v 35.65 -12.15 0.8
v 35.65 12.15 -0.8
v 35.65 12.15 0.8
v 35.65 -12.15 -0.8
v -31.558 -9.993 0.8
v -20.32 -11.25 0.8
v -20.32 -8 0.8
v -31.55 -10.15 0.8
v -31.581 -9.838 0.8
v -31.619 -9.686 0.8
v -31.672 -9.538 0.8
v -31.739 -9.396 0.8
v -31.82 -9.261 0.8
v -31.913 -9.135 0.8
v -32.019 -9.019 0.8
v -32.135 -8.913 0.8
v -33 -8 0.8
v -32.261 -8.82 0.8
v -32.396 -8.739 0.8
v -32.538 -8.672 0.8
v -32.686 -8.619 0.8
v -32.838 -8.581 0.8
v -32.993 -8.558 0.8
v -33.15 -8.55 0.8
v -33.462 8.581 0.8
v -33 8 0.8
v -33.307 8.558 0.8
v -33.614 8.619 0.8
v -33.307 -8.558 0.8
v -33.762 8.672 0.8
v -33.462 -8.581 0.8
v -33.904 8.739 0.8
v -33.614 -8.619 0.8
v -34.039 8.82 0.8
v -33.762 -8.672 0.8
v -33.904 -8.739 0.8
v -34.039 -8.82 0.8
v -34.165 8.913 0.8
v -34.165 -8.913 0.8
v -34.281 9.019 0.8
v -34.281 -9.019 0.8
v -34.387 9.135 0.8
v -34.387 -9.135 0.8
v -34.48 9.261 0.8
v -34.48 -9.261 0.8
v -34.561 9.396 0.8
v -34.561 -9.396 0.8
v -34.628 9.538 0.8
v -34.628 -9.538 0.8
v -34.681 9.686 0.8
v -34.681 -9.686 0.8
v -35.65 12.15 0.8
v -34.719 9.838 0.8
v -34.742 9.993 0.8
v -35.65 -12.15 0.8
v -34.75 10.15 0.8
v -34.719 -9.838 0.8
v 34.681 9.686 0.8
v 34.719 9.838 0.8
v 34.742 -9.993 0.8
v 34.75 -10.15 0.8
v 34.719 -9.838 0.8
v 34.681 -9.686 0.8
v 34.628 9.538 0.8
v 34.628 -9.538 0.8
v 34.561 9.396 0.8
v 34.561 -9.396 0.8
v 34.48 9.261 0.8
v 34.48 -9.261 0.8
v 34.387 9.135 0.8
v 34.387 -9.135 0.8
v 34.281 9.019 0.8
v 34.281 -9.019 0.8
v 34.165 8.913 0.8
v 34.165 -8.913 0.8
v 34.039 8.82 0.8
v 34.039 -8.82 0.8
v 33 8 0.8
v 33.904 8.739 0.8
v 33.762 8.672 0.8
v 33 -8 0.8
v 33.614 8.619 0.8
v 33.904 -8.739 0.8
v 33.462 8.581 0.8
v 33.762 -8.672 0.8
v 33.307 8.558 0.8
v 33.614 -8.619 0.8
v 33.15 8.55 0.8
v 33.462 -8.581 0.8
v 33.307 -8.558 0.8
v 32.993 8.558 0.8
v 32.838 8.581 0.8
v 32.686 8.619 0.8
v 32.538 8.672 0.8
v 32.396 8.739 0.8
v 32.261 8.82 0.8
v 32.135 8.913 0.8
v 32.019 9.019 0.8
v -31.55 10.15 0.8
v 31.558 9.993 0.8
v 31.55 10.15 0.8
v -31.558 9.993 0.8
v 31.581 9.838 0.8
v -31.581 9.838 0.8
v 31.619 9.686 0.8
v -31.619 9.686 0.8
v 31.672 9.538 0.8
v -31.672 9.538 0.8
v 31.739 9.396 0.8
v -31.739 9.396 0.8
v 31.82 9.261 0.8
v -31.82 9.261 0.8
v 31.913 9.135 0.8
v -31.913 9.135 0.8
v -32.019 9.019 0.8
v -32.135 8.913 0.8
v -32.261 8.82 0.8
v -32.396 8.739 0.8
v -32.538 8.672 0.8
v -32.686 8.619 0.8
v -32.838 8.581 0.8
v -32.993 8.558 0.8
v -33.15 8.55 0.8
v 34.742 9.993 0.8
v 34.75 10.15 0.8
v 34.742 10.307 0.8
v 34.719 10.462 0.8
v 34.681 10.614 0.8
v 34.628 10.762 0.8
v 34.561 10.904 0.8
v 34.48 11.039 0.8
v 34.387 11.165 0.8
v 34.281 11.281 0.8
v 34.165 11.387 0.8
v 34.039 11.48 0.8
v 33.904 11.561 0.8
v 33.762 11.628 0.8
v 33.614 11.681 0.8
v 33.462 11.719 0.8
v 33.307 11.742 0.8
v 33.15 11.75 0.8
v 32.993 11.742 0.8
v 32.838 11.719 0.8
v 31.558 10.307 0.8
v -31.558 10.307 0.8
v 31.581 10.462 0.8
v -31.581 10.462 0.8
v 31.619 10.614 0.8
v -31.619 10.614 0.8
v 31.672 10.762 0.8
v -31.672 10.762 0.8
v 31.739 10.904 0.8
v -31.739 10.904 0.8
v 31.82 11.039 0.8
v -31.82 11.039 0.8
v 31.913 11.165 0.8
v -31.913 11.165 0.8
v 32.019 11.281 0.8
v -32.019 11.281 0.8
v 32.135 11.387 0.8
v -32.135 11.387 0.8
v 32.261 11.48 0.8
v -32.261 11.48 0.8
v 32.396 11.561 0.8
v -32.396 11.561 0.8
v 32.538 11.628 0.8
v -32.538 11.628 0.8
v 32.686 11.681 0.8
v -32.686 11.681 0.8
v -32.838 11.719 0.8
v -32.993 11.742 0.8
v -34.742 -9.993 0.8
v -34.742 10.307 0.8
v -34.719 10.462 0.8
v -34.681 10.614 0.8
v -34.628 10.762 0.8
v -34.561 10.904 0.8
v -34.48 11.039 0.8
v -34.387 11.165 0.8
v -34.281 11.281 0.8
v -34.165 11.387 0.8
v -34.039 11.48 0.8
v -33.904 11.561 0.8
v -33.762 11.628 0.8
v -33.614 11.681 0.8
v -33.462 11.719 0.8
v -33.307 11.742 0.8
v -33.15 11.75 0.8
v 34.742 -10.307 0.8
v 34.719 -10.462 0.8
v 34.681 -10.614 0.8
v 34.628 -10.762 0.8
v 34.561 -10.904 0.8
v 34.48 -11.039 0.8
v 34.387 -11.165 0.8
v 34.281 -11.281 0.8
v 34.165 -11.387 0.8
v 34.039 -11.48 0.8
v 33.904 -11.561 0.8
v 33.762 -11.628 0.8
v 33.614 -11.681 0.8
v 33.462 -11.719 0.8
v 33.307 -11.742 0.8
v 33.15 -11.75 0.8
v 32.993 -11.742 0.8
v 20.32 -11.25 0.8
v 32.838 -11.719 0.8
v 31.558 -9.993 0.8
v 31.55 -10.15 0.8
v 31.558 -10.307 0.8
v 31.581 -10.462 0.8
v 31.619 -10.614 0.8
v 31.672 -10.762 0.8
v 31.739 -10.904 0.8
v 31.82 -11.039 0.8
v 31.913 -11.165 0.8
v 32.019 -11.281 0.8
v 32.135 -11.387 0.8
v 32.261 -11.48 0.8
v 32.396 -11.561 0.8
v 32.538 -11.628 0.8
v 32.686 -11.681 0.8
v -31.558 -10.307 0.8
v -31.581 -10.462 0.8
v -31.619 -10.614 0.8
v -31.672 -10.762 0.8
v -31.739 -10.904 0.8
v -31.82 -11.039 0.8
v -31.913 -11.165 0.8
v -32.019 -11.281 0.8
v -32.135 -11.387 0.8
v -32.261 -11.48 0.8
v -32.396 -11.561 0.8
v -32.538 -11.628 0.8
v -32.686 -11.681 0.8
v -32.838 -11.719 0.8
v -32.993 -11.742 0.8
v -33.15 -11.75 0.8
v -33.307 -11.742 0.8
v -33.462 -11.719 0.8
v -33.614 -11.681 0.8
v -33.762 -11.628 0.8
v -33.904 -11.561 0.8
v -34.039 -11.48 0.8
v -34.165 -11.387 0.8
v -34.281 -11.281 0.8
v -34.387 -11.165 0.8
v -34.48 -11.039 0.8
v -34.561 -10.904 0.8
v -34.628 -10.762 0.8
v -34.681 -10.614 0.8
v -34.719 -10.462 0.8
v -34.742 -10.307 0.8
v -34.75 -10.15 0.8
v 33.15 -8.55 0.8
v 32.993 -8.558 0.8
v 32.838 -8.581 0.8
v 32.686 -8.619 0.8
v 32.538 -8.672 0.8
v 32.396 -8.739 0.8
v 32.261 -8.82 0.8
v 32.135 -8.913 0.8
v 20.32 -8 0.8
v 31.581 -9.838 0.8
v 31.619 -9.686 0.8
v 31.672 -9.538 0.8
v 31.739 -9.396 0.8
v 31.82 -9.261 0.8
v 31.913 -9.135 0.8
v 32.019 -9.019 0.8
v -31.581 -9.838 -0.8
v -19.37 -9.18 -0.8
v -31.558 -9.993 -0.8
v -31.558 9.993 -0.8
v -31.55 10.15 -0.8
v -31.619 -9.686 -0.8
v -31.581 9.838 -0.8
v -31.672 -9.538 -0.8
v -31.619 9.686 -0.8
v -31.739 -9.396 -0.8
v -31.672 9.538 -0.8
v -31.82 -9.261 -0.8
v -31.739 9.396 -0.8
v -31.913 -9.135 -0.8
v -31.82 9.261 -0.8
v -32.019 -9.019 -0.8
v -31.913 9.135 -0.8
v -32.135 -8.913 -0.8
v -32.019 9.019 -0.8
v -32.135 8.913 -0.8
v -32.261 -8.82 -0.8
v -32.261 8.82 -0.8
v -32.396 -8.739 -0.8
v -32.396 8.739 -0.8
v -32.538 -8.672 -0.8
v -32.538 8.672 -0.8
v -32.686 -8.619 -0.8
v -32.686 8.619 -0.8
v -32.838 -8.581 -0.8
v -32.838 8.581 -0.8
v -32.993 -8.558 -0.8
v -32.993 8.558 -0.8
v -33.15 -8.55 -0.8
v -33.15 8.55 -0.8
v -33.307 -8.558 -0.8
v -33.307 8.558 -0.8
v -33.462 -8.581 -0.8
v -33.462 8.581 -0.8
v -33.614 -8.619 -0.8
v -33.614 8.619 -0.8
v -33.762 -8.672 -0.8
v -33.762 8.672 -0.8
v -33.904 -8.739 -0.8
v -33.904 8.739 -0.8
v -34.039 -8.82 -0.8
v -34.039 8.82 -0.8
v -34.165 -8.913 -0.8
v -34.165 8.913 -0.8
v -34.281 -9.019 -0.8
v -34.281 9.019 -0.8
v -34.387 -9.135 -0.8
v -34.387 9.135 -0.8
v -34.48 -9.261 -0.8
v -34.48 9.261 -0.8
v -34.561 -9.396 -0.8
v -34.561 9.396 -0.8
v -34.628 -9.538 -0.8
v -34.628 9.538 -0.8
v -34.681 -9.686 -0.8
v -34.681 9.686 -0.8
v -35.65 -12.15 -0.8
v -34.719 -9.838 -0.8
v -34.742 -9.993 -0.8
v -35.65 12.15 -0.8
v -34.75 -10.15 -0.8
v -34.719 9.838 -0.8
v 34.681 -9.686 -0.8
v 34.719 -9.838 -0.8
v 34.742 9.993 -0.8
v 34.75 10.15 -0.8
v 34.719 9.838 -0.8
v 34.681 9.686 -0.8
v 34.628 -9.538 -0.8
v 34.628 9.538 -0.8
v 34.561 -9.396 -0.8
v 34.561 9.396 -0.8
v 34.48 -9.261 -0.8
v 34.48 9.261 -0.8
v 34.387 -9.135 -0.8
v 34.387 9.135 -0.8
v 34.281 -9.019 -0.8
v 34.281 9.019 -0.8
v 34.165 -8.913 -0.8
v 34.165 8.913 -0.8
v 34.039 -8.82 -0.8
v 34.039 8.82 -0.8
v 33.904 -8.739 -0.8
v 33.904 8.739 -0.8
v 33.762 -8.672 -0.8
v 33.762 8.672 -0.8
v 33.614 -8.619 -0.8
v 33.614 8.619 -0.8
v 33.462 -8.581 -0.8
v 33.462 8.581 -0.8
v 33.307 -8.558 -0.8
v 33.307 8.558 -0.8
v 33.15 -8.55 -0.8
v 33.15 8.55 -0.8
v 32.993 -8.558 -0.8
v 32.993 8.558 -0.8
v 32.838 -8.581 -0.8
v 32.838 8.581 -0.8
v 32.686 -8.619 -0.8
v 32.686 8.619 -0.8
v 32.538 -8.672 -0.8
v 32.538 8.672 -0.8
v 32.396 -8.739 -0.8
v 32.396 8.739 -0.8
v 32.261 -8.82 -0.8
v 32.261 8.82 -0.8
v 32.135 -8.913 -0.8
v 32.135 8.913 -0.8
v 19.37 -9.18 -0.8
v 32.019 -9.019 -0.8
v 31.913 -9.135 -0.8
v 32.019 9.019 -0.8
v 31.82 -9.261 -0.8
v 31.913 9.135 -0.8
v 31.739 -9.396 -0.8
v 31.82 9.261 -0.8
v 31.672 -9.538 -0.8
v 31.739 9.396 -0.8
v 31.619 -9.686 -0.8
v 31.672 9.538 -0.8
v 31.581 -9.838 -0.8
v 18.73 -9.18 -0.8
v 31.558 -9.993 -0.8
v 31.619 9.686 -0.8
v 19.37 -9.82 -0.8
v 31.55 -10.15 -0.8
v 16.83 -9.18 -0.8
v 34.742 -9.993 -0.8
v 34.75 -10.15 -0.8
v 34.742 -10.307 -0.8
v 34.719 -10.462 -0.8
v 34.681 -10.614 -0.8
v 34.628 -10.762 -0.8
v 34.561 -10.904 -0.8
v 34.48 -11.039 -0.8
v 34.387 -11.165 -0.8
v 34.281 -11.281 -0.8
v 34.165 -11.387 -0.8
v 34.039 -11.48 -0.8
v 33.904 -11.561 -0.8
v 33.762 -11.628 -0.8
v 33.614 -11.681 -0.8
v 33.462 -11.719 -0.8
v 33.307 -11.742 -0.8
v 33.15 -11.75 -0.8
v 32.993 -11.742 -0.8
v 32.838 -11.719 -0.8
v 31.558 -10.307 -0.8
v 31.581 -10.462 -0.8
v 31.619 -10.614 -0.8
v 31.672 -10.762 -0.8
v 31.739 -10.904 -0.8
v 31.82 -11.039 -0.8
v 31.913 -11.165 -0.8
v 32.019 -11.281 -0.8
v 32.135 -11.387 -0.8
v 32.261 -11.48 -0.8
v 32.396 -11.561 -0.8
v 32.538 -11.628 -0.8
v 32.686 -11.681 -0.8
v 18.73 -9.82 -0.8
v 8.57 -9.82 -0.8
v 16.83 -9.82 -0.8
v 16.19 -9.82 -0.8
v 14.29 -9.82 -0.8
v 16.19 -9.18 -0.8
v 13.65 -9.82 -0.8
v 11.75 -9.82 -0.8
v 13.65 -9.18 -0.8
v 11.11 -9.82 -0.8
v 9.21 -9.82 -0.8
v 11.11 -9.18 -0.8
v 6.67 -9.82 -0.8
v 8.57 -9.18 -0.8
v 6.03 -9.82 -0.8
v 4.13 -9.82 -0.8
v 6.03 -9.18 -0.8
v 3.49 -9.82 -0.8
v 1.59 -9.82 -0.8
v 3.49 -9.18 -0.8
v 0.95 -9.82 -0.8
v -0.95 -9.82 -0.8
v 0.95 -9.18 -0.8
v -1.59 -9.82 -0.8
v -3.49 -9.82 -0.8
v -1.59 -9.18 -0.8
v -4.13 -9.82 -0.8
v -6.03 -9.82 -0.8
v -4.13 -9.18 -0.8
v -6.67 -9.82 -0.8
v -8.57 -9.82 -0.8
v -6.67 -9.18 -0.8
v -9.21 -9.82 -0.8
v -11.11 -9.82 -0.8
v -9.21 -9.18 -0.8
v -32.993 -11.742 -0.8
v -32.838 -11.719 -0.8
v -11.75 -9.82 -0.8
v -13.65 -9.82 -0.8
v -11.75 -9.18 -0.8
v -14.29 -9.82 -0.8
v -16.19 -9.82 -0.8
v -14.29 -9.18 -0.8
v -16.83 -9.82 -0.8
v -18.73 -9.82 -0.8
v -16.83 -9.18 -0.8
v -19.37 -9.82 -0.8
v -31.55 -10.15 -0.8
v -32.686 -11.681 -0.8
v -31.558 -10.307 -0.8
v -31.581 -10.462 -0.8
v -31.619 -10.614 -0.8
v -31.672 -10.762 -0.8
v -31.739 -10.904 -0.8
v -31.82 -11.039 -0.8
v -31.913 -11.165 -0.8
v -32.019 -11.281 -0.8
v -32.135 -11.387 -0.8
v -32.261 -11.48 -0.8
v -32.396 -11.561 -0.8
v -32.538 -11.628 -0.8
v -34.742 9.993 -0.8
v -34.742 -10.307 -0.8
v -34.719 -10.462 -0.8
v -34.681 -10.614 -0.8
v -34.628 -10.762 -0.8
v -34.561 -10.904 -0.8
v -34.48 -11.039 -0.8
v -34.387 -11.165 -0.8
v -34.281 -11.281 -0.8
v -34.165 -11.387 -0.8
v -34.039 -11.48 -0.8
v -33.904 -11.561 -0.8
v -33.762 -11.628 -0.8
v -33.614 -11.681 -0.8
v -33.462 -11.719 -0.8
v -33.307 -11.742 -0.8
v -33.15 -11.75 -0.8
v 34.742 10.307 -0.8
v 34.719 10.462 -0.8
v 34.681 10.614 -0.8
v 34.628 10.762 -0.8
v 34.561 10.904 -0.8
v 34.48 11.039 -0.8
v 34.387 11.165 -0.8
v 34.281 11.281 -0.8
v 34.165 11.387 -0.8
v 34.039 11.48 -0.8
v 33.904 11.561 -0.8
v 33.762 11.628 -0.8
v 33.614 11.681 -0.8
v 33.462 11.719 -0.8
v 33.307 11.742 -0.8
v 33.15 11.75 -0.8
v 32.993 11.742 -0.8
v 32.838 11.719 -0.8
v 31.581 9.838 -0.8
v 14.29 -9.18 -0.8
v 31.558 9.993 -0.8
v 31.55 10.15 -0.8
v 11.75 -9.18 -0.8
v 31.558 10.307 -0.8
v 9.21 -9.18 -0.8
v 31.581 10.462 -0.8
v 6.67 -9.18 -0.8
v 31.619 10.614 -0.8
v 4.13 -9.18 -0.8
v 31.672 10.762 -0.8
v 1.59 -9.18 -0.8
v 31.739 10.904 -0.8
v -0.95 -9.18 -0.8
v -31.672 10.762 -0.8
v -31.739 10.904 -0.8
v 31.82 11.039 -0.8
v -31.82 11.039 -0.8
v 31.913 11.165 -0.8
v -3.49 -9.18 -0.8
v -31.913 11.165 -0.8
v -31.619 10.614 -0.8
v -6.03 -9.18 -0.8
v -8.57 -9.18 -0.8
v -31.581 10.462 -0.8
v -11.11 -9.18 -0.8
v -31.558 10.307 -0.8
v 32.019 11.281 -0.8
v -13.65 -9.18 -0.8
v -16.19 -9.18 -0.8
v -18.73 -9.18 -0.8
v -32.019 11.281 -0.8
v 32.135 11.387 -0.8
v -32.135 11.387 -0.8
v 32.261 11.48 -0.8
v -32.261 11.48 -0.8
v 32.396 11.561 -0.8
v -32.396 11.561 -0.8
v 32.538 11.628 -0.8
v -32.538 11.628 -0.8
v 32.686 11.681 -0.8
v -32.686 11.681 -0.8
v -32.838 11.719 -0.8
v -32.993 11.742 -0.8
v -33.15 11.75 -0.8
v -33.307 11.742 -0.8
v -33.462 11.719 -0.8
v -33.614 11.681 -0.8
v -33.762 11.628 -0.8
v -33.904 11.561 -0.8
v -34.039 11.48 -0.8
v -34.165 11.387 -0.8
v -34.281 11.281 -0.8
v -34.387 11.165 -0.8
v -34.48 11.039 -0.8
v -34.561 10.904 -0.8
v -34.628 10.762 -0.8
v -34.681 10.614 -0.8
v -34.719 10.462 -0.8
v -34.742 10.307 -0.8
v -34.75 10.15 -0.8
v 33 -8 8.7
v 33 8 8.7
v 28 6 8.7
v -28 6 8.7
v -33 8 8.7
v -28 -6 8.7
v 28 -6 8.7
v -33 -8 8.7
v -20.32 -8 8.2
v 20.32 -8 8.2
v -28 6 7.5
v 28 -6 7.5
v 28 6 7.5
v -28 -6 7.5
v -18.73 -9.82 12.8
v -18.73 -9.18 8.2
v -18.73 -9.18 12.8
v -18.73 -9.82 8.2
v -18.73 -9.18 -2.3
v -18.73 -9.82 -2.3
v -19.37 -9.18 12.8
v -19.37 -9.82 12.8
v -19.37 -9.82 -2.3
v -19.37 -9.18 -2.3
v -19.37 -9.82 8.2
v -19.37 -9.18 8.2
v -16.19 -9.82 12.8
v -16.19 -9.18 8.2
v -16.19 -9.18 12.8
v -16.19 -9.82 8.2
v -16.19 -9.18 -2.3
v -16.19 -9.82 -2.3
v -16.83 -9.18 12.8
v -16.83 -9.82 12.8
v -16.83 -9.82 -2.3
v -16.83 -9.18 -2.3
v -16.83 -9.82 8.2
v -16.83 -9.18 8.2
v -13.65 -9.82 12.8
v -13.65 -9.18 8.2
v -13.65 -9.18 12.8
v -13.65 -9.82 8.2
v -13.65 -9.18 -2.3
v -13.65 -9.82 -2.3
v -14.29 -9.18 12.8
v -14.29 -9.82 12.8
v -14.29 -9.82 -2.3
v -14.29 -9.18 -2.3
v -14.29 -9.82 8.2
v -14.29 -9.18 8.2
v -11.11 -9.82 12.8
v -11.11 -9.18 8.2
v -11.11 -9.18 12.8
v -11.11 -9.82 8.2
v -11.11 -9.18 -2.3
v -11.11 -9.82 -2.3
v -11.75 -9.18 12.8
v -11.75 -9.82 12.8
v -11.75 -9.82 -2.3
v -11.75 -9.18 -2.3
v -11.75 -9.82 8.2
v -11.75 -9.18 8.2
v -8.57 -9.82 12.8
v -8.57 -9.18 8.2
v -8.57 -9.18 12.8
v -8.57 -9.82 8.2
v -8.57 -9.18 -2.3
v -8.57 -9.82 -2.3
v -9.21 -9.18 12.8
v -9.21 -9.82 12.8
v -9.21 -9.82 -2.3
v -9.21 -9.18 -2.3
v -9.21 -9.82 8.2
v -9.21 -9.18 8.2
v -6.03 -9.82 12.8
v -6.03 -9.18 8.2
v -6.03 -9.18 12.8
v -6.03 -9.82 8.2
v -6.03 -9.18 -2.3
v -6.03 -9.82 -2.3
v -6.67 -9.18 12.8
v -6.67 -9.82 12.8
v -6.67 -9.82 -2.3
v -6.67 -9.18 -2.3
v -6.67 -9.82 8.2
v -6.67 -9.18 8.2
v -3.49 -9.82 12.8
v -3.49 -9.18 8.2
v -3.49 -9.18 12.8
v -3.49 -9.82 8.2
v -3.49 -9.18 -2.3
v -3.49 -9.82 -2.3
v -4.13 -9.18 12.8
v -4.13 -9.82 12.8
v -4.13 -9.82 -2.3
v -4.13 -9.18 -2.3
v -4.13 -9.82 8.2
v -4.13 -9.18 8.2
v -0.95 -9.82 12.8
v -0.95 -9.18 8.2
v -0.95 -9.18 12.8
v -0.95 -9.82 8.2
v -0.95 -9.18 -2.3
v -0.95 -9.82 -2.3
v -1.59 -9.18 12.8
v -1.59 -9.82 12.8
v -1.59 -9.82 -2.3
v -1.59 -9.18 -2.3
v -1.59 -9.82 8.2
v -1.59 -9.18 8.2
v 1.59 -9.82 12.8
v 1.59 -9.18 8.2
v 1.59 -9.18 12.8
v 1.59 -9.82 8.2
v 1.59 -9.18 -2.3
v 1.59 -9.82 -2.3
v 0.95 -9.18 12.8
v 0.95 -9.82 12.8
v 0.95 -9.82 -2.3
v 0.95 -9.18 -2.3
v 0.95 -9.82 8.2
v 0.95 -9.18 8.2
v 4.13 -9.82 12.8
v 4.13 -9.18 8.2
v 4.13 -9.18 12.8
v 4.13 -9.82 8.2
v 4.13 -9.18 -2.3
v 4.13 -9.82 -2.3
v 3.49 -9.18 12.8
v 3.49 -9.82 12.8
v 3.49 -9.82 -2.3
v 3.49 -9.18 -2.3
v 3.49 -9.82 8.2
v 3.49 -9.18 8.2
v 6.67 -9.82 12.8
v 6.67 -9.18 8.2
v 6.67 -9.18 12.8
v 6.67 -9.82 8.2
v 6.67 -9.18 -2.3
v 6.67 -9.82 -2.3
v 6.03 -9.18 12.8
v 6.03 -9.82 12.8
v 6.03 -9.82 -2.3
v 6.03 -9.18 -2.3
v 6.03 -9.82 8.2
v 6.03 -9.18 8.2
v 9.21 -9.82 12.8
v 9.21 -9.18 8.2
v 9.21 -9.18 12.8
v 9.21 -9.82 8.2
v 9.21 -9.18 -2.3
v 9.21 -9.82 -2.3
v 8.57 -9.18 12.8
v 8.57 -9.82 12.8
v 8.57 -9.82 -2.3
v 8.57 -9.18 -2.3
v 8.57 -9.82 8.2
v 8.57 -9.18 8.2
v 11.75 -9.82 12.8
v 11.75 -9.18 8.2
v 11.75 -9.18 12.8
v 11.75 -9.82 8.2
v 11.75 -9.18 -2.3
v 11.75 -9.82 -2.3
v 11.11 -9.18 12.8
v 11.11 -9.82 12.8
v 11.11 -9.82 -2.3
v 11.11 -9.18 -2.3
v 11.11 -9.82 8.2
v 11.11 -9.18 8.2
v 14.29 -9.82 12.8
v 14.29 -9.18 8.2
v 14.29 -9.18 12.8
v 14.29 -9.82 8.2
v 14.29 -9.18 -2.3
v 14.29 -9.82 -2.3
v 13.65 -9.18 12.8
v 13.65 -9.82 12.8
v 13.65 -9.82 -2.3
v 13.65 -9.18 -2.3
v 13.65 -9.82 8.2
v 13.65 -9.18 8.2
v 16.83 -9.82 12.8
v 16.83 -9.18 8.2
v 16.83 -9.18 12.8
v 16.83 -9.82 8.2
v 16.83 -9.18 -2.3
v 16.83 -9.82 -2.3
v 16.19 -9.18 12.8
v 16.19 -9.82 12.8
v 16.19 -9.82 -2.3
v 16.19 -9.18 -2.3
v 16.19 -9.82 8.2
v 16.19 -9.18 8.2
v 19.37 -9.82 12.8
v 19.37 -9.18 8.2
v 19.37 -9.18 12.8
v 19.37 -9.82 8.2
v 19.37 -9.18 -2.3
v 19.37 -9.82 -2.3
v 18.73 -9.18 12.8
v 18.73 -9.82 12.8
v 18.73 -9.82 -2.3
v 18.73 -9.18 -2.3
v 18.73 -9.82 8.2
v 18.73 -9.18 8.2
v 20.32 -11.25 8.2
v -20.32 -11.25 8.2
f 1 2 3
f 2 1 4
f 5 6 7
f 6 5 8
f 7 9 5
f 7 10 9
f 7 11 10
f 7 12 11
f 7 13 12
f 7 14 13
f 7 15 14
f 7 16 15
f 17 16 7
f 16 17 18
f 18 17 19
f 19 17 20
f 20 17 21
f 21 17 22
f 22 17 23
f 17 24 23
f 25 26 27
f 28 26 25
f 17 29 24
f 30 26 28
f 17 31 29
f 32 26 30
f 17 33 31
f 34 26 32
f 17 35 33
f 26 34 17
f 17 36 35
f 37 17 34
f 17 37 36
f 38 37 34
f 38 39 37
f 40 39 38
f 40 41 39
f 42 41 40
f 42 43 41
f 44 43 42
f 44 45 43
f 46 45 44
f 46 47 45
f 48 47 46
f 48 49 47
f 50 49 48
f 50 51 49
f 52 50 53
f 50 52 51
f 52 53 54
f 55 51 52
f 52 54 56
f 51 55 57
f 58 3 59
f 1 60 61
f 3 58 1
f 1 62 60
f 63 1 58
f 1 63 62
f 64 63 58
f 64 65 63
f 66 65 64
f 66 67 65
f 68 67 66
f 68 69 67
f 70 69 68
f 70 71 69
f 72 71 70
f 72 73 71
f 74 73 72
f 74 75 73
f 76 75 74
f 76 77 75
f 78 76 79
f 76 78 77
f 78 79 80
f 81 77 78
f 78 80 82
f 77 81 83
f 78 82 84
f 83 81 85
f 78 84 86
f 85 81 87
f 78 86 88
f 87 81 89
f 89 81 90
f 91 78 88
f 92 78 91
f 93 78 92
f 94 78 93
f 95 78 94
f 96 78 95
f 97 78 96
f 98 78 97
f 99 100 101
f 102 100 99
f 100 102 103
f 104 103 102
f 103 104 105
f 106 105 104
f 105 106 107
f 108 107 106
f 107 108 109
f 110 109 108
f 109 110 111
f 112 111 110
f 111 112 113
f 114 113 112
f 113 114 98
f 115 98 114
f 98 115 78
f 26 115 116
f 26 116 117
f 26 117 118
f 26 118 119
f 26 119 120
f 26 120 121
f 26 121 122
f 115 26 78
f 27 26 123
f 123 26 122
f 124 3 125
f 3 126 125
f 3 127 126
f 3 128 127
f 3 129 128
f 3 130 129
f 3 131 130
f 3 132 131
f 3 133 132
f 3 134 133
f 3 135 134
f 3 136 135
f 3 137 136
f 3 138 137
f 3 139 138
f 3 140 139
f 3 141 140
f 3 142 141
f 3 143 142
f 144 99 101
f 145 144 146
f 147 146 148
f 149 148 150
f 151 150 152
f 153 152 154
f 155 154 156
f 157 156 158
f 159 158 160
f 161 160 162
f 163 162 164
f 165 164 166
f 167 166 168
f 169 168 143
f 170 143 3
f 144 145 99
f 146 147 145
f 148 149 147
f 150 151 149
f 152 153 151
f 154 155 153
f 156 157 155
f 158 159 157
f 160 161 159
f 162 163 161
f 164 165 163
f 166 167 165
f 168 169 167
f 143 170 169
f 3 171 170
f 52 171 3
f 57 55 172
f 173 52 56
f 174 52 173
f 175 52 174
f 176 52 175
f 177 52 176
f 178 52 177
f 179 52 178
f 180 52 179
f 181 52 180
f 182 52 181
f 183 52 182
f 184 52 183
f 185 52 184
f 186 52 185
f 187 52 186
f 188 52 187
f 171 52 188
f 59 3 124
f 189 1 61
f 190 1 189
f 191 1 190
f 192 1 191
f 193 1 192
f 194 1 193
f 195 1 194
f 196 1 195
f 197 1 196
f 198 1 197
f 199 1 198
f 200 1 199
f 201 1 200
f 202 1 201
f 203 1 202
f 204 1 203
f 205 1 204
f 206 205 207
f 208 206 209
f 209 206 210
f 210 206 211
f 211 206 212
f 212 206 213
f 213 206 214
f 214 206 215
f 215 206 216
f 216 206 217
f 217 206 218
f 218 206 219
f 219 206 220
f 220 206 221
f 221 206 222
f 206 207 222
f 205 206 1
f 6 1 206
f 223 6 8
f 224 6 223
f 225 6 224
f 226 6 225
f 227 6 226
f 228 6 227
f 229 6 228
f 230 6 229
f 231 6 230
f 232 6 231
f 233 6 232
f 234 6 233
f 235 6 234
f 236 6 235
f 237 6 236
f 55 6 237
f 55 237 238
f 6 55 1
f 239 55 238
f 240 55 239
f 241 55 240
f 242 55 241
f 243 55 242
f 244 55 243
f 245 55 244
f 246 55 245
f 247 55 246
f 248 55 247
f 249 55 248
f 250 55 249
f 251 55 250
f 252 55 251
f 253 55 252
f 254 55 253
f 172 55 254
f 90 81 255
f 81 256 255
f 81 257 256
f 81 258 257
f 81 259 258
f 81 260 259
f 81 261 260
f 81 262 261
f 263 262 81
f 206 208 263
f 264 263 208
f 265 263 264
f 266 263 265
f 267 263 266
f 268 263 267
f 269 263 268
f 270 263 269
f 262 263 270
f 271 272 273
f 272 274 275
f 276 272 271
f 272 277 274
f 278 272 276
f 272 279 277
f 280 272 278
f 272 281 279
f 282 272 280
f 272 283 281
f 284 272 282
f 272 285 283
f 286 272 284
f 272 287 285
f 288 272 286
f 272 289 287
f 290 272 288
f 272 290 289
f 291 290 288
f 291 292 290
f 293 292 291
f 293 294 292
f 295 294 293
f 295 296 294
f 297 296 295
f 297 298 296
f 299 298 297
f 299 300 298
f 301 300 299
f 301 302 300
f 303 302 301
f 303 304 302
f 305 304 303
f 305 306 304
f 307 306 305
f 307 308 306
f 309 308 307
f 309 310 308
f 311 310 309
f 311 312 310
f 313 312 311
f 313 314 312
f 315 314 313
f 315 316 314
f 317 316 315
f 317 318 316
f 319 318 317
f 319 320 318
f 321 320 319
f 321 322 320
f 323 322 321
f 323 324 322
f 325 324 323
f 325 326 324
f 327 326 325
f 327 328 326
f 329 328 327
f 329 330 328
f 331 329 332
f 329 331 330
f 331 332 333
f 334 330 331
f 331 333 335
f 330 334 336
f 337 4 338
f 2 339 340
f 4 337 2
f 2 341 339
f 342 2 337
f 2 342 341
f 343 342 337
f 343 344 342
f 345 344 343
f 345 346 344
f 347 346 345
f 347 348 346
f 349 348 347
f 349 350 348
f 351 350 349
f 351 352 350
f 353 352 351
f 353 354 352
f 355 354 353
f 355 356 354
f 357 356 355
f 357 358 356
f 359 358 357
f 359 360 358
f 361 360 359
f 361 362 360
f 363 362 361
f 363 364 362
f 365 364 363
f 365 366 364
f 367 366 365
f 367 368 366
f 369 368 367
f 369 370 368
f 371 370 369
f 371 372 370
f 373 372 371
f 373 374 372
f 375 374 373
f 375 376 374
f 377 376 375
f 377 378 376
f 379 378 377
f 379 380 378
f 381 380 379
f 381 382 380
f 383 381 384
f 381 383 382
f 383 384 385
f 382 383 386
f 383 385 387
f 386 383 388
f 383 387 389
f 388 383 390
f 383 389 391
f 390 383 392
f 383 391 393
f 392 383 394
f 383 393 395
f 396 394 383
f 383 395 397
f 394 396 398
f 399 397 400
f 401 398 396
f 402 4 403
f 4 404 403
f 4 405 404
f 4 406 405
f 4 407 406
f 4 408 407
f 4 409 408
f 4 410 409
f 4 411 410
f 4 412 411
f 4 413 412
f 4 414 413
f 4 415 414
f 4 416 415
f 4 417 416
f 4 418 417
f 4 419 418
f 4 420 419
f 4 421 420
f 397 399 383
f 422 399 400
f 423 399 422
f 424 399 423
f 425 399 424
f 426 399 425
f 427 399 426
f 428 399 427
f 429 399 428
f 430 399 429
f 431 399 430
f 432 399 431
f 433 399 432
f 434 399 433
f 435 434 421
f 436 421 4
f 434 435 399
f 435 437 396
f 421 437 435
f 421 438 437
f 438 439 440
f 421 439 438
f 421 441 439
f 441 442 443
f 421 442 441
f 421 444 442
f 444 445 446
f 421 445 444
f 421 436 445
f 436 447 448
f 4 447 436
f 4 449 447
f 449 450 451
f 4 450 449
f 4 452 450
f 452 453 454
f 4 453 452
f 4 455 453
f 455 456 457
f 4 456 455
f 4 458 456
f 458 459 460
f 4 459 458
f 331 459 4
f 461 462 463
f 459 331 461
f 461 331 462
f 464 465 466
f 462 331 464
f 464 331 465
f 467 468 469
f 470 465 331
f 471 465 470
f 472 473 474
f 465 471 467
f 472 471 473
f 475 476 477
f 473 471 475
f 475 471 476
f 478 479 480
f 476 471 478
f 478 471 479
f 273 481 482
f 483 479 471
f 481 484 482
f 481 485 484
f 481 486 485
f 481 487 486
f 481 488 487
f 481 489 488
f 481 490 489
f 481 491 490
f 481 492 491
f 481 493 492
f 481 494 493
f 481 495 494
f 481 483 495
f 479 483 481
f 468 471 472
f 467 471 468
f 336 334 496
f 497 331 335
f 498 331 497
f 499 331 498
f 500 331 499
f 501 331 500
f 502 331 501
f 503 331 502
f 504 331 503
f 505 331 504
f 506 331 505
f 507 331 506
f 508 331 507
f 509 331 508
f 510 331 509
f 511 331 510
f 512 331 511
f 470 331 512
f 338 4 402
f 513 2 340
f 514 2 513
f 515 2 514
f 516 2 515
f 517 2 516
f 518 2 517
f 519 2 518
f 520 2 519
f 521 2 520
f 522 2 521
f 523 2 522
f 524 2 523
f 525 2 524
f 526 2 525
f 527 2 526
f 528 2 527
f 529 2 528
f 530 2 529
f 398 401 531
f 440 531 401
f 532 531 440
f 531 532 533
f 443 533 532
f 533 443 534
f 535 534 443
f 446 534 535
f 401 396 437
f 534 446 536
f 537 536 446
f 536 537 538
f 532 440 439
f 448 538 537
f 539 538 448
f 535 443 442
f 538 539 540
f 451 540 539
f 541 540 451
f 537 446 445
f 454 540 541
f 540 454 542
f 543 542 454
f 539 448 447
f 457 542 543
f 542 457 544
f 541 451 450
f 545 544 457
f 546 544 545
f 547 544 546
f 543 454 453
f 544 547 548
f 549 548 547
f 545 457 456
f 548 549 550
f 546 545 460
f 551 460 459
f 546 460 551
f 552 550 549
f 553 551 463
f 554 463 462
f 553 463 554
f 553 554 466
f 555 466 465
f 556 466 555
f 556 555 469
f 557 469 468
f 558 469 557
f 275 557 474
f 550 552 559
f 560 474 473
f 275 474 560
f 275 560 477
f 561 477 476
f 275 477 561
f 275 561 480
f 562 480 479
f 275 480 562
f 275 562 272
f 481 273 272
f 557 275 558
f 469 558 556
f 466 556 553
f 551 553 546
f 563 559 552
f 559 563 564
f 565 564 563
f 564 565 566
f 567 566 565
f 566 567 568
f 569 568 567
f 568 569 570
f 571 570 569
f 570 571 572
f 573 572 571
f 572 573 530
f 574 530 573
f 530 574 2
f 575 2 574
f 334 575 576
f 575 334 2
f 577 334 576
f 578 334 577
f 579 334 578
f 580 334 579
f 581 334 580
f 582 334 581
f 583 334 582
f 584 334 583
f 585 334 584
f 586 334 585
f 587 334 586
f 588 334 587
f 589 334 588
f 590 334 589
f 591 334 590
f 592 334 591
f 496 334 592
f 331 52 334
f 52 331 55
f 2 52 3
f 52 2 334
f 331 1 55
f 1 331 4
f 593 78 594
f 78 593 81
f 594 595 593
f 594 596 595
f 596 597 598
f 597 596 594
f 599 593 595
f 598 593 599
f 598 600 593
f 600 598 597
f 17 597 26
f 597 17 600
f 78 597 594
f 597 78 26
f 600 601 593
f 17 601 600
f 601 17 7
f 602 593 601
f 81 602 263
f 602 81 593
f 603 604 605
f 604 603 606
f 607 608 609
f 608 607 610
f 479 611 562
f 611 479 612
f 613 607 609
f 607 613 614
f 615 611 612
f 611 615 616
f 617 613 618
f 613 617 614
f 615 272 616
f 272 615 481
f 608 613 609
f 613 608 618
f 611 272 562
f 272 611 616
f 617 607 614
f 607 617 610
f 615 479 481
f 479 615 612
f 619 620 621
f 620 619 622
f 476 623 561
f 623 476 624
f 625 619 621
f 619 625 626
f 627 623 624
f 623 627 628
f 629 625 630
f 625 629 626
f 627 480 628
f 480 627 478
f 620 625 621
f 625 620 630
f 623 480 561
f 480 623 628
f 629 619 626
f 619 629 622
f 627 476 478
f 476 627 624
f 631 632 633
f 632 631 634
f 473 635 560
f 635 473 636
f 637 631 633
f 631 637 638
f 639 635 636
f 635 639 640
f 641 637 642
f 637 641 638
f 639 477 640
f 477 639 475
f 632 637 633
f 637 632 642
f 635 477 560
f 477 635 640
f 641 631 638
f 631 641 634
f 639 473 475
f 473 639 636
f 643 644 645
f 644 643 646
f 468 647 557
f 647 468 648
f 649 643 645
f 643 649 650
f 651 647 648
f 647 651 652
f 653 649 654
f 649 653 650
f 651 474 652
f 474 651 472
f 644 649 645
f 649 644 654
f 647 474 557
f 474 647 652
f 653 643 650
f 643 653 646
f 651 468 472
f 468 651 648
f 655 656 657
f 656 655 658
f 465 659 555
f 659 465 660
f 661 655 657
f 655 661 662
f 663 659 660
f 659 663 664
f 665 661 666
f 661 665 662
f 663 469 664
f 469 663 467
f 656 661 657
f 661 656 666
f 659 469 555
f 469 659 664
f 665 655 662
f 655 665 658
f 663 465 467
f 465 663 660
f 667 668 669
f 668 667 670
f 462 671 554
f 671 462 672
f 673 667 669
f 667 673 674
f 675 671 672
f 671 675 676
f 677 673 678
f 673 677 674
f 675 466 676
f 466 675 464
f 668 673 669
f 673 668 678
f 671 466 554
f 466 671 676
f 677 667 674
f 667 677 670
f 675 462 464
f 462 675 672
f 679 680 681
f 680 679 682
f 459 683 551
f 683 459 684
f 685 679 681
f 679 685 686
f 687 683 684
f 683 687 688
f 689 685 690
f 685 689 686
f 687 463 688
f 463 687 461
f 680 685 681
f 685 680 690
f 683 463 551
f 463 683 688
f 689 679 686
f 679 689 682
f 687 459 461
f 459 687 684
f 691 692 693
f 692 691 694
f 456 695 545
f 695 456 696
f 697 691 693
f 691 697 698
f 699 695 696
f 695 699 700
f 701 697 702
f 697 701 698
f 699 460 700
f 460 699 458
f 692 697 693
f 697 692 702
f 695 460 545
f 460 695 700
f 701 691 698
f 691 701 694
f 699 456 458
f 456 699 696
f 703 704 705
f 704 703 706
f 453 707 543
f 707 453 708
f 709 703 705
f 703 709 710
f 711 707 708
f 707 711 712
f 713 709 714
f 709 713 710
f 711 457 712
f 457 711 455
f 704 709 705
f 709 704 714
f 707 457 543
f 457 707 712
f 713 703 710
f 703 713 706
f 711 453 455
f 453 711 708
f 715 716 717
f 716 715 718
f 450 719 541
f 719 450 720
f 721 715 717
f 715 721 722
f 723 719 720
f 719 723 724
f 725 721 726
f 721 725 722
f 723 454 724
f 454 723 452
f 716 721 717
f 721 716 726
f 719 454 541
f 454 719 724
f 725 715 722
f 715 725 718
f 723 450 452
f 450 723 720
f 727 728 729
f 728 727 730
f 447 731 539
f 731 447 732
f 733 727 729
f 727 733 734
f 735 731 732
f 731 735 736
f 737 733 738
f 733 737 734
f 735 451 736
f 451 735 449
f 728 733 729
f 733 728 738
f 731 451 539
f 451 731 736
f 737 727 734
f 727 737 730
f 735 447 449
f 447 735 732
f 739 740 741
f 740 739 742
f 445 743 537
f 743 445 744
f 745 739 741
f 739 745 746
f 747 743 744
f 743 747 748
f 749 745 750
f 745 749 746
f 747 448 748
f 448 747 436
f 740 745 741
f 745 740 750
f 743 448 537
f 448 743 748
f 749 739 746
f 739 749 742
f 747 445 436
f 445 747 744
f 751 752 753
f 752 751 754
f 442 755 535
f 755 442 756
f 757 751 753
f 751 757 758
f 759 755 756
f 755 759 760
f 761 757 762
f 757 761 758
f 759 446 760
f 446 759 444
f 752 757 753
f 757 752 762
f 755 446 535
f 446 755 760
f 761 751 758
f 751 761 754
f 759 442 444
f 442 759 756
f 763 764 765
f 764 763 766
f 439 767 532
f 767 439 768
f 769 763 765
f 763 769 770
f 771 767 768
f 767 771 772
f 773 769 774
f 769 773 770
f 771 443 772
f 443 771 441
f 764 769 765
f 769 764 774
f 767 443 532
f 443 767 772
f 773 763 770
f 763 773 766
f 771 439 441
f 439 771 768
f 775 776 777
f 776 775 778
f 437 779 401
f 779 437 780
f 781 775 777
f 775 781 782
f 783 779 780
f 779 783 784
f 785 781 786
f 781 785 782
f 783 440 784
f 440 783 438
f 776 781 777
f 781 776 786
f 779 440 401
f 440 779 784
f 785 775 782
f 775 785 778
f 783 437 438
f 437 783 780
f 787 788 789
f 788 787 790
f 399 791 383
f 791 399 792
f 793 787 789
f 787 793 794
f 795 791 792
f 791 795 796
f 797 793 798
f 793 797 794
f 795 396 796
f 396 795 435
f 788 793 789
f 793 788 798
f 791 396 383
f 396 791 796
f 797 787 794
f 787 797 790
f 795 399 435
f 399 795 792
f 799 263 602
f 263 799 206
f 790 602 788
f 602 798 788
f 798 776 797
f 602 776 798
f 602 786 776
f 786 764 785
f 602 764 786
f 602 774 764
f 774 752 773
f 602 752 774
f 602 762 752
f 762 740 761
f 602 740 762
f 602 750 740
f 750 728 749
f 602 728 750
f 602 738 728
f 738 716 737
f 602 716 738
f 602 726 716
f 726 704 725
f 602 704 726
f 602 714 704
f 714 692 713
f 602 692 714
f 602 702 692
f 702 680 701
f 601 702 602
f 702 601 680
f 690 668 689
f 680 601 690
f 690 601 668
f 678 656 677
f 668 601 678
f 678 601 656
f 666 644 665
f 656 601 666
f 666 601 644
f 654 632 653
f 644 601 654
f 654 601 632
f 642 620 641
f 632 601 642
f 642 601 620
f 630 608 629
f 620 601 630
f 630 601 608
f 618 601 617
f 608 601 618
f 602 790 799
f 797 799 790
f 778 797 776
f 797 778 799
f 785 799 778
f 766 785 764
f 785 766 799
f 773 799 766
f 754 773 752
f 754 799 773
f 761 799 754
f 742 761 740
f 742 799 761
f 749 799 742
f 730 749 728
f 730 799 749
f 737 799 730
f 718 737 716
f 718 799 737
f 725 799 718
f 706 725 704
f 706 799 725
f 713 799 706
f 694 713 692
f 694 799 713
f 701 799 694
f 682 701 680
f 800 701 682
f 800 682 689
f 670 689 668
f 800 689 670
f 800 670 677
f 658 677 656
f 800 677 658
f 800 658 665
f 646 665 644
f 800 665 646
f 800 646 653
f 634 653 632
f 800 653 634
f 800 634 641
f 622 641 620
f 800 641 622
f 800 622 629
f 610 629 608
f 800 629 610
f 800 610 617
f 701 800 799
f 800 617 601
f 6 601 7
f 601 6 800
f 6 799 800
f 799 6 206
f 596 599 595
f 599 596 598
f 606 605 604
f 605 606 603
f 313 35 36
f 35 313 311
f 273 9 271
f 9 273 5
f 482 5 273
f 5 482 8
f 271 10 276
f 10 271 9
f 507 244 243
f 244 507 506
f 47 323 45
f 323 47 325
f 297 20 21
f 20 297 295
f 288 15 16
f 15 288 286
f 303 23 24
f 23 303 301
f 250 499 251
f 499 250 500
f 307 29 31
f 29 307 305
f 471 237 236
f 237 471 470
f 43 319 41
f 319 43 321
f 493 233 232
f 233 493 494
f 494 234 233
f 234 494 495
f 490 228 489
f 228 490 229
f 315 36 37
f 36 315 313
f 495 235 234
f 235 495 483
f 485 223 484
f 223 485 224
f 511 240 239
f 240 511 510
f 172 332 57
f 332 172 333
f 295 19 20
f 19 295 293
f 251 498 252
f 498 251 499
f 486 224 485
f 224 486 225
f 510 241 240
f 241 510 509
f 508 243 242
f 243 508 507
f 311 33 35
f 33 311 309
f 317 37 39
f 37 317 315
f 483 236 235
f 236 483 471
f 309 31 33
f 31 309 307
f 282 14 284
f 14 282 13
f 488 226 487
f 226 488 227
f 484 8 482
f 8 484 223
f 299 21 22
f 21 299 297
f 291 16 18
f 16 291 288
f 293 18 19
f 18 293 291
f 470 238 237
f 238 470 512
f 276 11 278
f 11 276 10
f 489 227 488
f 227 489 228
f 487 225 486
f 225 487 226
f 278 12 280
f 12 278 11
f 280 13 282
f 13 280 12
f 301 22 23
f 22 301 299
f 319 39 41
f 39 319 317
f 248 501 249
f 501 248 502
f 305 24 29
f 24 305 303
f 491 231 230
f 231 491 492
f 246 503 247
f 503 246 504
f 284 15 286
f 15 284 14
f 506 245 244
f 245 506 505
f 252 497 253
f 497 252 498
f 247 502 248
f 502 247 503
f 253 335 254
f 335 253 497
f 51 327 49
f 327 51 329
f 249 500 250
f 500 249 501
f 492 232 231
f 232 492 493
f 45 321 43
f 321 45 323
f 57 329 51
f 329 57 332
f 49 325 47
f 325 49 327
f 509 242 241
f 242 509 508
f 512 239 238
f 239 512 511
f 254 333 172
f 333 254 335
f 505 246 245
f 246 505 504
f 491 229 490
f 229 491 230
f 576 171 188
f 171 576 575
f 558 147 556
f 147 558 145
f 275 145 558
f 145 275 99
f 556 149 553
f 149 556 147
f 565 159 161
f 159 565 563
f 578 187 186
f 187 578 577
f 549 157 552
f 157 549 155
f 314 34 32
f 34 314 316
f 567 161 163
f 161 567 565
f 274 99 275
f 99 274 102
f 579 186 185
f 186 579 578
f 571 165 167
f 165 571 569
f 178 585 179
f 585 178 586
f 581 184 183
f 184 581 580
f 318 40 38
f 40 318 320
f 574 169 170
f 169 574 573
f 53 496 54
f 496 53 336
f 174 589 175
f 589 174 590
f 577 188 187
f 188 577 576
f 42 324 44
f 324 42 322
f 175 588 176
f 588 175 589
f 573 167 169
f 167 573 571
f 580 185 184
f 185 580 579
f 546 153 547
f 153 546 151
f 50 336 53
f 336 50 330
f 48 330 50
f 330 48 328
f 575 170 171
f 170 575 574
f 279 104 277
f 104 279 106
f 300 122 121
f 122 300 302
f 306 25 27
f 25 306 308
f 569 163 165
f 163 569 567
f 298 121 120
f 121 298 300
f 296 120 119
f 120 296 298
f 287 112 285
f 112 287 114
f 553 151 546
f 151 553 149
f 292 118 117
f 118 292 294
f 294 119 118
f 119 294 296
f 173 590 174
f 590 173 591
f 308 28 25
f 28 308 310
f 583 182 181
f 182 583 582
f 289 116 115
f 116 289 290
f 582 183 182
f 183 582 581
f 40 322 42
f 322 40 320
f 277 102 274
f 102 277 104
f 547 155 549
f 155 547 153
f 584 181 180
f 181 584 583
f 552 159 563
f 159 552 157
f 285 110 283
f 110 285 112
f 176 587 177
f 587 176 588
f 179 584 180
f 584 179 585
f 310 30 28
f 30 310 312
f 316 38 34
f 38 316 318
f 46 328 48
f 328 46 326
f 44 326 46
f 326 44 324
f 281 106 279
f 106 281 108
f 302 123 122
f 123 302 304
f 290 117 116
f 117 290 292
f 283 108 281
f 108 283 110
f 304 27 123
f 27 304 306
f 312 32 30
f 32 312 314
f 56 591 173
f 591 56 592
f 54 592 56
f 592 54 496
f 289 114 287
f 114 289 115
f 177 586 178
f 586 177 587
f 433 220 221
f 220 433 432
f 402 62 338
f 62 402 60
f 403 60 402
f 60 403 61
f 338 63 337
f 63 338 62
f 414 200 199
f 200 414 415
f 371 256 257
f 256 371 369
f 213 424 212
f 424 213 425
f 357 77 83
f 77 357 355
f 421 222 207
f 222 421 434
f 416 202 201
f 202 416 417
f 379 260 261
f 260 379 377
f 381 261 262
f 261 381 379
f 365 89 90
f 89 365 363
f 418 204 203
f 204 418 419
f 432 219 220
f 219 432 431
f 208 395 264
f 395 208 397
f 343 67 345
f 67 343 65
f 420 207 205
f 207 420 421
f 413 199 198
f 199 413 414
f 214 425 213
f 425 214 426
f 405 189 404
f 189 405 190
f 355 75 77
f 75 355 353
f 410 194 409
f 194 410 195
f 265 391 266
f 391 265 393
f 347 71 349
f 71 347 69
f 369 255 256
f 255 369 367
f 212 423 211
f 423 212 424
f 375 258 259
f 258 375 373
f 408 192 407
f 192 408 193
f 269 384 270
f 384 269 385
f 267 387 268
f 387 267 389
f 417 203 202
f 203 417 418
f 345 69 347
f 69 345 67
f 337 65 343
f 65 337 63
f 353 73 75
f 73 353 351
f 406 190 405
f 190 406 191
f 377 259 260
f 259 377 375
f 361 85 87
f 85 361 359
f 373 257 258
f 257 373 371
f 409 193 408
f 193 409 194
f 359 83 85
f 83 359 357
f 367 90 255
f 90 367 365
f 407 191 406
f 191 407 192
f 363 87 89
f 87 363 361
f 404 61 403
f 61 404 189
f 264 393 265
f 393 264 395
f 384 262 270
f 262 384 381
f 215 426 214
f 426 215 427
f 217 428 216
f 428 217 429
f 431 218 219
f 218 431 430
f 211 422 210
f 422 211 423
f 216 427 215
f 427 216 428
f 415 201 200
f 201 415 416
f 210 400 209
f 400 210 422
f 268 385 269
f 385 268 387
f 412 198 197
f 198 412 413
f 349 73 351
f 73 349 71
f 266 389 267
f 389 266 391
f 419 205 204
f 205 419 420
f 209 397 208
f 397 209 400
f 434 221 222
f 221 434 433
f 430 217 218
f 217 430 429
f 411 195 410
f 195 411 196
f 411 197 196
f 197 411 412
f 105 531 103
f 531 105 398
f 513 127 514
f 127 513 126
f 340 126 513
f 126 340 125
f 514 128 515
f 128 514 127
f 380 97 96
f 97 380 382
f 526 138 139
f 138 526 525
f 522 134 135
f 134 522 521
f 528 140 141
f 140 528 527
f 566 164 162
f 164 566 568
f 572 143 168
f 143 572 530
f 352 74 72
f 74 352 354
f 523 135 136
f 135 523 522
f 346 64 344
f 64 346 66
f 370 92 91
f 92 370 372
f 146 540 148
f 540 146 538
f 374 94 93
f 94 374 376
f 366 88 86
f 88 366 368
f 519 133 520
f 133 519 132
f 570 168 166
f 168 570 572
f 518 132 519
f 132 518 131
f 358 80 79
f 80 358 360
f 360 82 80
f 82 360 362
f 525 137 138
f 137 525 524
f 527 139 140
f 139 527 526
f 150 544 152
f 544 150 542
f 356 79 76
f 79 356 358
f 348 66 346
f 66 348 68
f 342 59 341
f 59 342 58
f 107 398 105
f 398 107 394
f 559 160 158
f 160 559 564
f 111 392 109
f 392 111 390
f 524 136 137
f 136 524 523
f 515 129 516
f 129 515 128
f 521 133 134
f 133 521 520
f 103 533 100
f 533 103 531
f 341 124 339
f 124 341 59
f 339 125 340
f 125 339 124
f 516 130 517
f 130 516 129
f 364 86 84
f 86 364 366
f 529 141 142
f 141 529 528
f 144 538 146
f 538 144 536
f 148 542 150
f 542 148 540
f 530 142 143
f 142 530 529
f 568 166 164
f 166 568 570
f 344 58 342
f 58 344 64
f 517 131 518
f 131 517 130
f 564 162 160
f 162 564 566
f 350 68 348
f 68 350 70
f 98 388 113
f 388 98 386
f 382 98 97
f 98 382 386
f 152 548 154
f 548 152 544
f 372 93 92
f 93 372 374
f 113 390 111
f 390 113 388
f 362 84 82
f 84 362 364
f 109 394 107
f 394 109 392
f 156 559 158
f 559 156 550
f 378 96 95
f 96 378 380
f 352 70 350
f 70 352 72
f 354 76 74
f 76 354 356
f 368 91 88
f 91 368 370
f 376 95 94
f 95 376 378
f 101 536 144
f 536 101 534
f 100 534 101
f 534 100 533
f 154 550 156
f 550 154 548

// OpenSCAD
$fn = 64;

// Parameters (1602A overall: 71.3 x 24.3)
module_width_mm  = 71.3;   //[35.65:142.6:0.1]
module_height_mm = 24.3;   //[12.15:48.6:0.1]
pcb_thickness_mm = 1.6;    //[0.8:3.2:0.1]

// LCD bezel/body
module_thickness_mm        = 8.5;   //[4.0:17.0:0.1]
display_body_width_mm      = 66.0;  //[33.0:132.0:0.1]
display_body_height_mm     = 16.0;  //[8.0:32.0:0.1]
display_body_offset_x_mm   = 0;     //[-10:10:0.1]
display_body_offset_y_mm   = 0;     //[-6:6:0.1]

// Viewing window
viewing_window_width_mm    = 56.0;  //[28.0:112.0:0.1]
viewing_window_height_mm   = 12.0;  //[6.0:24.0:0.1]
viewing_window_offset_x_mm = 0;     //[-10:10:0.1]
viewing_window_offset_y_mm = 0;     //[-6:6:0.1]
viewing_window_depth_mm    = 1.2;   //[0.5:3.0:0.1]

// Mount holes
mount_hole_diameter_mm     = 3.2;   //[2.0:6.0:0.1]
mount_hole_edge_margin_x_mm= 2.5;   //[1.0:6.0:0.1]
mount_hole_edge_margin_y_mm= 2.0;   //[1.0:6.0:0.1]

// 16-pin header (typical 1x16, 2.54mm pitch)
pin_header_pitch_mm        = 2.54;  //[1.27:5.08:0.01]
pin_count                  = 16;    //[8:24:1]
pin_header_orientation_long_edge = 1; //[0:1:1]
pin_header_depth_mm        = 3.5;   //[2.0:8.0:0.1]   // plastic width (short dimension)
pin_header_height_mm       = 8.0;   //[4.0:16.0:0.1]  // plastic height
pin_header_edge_margin_mm  = 1.5;   //[0.5:5.0:0.1]

// Pins (simple representation)
pin_square_mm              = 0.64;  //[0.3:1.2:0.01]
pin_length_below_pcb_mm    = 3.0;   //[1.0:8.0:0.1]
pin_length_above_plastic_mm= 2.5;   //[0.5:6.0:0.1]

// Robust overlap to ensure ONE connected solid
overlap_mm = 0.6; //[0.2:2.0:0.1]

// Derived
pin_header_row_length_mm = (pin_count - 1) * pin_header_pitch_mm;

// Z references (PCB centered at Z=0)
pcb_top_z = pcb_thickness_mm/2;
pcb_bot_z = -pcb_thickness_mm/2;

// LCD body placement (sits on PCB top, with slight overlap)
lcd_body_center_z = pcb_top_z + module_thickness_mm/2 - overlap_mm;

// Header placement (sits on PCB top, with slight overlap)
header_plastic_center_z = pcb_top_z + pin_header_height_mm/2 - overlap_mm;

// Pin placement (goes through PCB and into plastic a bit)
pin_total_len = pin_length_below_pcb_mm + pcb_thickness_mm + pin_header_height_mm + pin_length_above_plastic_mm;
pin_center_z  = pcb_bot_z - pin_length_below_pcb_mm/2 + (pin_total_len/2);

// Helper: mounting hole positions
function hole_x(sign) = sign * (module_width_mm/2  - mount_hole_edge_margin_x_mm);
function hole_y(sign) = sign * (module_height_mm/2 - mount_hole_edge_margin_y_mm);

// PCB with holes (holes are cut through entire assembly thickness)
module pcb_with_holes(cut_h) {
  difference() {
    cube([module_width_mm, module_height_mm, pcb_thickness_mm], center=true);
    for (sx = [-1, 1], sy = [-1, 1]) {
      translate([hole_x(sx), hole_y(sy), 0])
        cylinder(d=mount_hole_diameter_mm, h=cut_h, center=true);
    }
  }
}

// LCD body with recessed window
module lcd_body() {
  translate([display_body_offset_x_mm, display_body_offset_y_mm, lcd_body_center_z])
    difference() {
      cube([display_body_width_mm, display_body_height_mm, module_thickness_mm], center=true);

      // Recess for viewing window (cut from front/top face)
      translate([viewing_window_offset_x_mm, viewing_window_offset_y_mm,
                 module_thickness_mm/2 - viewing_window_depth_mm/2 + overlap_mm])
        cube([viewing_window_width_mm, viewing_window_height_mm, viewing_window_depth_mm + overlap_mm*2], center=true);
    }
}

// Viewing window "glass" (slightly inset, overlaps body)
module viewing_window() {
  translate([display_body_offset_x_mm + viewing_window_offset_x_mm,
             display_body_offset_y_mm + viewing_window_offset_y_mm,
             pcb_top_z + module_thickness_mm - viewing_window_depth_mm/2 - overlap_mm])
    cube([viewing_window_width_mm, viewing_window_height_mm, viewing_window_depth_mm], center=true);
}

// Header plastic block + pins (connected to PCB via overlap)
module pin_header() {
  // Determine header axis and placement along an edge
  if (pin_header_orientation_long_edge == 1) {
    // Along X (long edge), placed near -Y edge
    header_center_y = -(module_height_mm/2) + pin_header_edge_margin_mm + pin_header_depth_mm/2 - overlap_mm;

    // Plastic
    translate([0, header_center_y, header_plastic_center_z])
      cube([pin_header_row_length_mm + pin_header_pitch_mm, pin_header_depth_mm, pin_header_height_mm], center=true);

    // Pins (1xN)
    for (i = [0:pin_count-1]) {
      x_i = -((pin_count-1)*pin_header_pitch_mm)/2 + i*pin_header_pitch_mm;
      translate([x_i, header_center_y, pin_center_z])
        cube([pin_square_mm, pin_square_mm, pin_total_len], center=true);
    }
  } else {
    // Along Y (short edge), placed near -X edge
    header_center_x = -(module_width_mm/2) + pin_header_edge_margin_mm + pin_header_depth_mm/2 - overlap_mm;

    // Plastic
    translate([header_center_x, 0, header_plastic_center_z])
      cube([pin_header_depth_mm, pin_header_row_length_mm + pin_header_pitch_mm, pin_header_height_mm], center=true);

    // Pins (1xN)
    for (i = [0:pin_count-1]) {
      y_i = -((pin_count-1)*pin_header_pitch_mm)/2 + i*pin_header_pitch_mm;
      translate([header_center_x, y_i, pin_center_z])
        cube([pin_square_mm, pin_square_mm, pin_total_len], center=true);
    }
  }
}

// Final assembly: ONE connected solid (union), with holes cut after union
module assembly() {
  // Height for hole cutting: cover pins below PCB to top of LCD body
  cut_h = (pin_length_below_pcb_mm + pcb_thickness_mm + module_thickness_mm + pin_header_height_mm + pin_length_above_plastic_mm) + 10;

  difference() {
    union() {
      pcb_with_holes(0); // no holes here; holes cut in final difference for robustness
      lcd_body();
      viewing_window();
      pin_header();
    }

    // Cut mounting holes through everything
    for (sx = [-1, 1], sy = [-1, 1]) {
      translate([hole_x(sx), hole_y(sy), 0])
        cylinder(d=mount_hole_diameter_mm, h=cut_h, center=true);
    }
  }
}

assembly();
